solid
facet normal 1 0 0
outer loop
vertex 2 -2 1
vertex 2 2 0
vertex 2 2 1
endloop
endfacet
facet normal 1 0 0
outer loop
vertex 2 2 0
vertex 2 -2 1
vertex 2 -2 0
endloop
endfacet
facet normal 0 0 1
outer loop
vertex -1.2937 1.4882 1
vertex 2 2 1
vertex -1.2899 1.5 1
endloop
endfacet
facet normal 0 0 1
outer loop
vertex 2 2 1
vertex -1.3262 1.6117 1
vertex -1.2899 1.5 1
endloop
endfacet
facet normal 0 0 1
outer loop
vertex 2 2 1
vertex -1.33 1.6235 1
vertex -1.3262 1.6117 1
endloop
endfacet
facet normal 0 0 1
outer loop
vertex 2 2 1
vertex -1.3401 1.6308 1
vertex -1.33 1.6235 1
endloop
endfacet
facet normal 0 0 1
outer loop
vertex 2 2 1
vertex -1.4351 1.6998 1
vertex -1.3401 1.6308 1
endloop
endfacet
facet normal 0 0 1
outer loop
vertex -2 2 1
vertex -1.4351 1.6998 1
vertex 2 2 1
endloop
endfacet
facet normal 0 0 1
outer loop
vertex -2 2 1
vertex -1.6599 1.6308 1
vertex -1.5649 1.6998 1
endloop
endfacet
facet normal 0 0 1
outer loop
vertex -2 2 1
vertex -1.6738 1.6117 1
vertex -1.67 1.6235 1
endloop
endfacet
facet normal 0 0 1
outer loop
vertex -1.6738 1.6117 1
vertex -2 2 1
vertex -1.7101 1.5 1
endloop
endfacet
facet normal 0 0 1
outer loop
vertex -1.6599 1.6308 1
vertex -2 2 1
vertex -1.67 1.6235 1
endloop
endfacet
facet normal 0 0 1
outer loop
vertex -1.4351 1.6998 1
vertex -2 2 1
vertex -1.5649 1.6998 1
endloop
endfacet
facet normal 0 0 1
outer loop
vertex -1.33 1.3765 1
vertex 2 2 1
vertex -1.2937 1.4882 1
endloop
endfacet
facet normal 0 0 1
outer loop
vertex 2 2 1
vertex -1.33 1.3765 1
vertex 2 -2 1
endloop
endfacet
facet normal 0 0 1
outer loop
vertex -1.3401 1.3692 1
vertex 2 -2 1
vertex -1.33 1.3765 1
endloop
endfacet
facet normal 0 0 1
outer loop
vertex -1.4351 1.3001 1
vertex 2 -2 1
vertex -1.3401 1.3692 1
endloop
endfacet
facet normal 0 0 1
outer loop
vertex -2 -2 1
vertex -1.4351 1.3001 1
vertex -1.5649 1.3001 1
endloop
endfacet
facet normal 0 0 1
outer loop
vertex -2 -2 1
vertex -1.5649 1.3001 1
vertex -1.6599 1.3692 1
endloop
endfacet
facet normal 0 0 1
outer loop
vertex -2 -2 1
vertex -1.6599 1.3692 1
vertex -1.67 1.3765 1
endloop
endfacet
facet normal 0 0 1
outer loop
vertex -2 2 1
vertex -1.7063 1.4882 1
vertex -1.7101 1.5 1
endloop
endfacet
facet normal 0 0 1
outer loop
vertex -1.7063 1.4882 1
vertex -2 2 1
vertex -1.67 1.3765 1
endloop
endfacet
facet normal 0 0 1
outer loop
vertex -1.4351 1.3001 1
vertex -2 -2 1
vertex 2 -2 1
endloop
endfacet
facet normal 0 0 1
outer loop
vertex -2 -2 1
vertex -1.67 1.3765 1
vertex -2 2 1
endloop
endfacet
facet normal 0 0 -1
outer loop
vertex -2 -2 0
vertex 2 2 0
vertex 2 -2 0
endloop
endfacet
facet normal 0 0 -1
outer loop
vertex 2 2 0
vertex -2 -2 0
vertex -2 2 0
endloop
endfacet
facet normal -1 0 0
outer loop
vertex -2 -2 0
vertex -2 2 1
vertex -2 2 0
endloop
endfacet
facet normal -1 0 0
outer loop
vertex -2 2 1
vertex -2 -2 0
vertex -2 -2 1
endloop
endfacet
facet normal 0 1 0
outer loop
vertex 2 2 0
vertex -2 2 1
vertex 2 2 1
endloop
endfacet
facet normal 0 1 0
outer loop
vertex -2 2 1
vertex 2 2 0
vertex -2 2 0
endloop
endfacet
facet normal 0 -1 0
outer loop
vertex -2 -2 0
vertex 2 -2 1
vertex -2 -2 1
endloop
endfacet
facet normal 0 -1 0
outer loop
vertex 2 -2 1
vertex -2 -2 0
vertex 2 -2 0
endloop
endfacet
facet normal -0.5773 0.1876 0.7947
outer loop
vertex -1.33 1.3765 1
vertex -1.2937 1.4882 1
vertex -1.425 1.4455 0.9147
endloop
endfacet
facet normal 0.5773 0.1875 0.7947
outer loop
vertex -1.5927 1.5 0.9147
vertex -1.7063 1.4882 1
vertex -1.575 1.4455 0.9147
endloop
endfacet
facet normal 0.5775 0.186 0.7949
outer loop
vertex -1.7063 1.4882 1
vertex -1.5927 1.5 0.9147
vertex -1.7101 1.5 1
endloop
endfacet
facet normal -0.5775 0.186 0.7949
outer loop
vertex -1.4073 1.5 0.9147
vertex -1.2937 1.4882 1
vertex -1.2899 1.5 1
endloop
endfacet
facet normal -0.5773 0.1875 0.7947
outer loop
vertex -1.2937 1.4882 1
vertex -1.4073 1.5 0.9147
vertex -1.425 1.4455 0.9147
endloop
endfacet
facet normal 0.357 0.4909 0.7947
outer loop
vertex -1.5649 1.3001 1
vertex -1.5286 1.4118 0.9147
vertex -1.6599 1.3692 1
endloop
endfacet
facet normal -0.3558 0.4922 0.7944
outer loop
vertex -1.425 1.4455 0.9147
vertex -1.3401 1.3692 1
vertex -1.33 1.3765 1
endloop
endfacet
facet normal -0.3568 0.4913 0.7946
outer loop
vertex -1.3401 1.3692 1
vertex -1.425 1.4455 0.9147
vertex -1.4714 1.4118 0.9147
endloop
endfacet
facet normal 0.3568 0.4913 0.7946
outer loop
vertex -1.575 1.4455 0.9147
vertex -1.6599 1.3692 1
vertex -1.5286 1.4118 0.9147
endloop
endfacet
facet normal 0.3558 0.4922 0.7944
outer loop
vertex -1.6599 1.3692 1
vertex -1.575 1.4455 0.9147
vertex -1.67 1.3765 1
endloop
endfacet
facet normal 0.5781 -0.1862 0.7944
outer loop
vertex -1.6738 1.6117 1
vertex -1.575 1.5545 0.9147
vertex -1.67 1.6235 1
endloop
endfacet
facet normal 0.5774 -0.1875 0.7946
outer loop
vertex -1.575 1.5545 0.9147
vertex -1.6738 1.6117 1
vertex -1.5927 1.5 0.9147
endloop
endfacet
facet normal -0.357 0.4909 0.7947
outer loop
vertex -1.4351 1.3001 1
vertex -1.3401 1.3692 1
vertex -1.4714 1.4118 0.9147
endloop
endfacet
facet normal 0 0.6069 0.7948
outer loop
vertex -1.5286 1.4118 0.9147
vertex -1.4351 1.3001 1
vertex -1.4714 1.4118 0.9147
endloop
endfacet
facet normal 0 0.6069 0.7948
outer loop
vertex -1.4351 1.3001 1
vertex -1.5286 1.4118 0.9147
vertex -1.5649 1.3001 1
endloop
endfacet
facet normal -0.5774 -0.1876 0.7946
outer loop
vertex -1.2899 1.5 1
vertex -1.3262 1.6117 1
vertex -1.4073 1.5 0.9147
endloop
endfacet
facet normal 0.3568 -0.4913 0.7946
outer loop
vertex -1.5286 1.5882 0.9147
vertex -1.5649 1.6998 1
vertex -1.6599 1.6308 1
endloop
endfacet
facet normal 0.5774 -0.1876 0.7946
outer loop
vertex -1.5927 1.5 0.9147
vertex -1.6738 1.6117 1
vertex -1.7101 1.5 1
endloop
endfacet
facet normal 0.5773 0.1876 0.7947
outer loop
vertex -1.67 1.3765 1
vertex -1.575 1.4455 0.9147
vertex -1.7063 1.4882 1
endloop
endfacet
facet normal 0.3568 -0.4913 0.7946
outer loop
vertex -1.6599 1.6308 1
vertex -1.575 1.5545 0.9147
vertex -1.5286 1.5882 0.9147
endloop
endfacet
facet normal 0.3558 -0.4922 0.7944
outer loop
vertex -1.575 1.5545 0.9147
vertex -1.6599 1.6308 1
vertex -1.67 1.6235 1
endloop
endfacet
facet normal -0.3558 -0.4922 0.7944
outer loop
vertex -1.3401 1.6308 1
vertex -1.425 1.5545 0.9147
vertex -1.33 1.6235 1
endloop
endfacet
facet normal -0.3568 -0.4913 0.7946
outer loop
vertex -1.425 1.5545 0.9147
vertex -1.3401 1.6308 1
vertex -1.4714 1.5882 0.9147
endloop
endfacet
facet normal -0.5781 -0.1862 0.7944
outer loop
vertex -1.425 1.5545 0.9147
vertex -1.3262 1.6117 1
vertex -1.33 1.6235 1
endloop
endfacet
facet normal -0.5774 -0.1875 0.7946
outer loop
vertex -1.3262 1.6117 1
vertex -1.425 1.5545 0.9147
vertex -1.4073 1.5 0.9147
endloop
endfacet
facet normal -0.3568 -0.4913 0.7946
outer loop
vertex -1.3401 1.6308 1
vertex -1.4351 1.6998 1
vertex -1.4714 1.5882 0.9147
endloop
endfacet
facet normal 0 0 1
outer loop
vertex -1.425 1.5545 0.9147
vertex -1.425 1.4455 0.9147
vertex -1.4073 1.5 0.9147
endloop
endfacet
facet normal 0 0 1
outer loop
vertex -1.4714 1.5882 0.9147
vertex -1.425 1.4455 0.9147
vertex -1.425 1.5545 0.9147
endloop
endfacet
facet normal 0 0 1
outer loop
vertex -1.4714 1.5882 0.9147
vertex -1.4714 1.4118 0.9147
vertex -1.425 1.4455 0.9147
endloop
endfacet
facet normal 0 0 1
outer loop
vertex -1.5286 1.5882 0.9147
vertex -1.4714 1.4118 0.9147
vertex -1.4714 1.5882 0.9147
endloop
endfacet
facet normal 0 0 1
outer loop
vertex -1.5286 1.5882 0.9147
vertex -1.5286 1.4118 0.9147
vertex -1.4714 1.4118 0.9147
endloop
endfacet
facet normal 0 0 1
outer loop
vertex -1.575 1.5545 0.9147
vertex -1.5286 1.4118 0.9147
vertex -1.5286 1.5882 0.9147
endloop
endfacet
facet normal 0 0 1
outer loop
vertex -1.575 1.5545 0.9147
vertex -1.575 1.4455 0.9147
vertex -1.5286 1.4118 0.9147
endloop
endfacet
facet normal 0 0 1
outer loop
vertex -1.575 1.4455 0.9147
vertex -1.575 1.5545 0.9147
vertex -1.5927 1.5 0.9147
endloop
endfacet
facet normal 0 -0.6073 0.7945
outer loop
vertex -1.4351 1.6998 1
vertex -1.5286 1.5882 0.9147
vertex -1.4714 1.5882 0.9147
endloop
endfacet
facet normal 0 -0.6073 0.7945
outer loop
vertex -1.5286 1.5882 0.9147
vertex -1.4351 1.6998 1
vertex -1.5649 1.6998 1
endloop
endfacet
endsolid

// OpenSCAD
/*
 * Creates the Invensense MPU9150 IMU.
 *
 * Author: Ian McInerney
 * Created: June 22, 2013
 */

// Create the chip
translate([0.0,0.0,0.5])difference() {
	// The main chip body
	cube(size=[4.0,4.0,1.0], center=true);

	// The bump to indicate pin 1
	translate([-1.5,1.5,0.70])sphere(r=0.3, center=true, $fn=10);
}
